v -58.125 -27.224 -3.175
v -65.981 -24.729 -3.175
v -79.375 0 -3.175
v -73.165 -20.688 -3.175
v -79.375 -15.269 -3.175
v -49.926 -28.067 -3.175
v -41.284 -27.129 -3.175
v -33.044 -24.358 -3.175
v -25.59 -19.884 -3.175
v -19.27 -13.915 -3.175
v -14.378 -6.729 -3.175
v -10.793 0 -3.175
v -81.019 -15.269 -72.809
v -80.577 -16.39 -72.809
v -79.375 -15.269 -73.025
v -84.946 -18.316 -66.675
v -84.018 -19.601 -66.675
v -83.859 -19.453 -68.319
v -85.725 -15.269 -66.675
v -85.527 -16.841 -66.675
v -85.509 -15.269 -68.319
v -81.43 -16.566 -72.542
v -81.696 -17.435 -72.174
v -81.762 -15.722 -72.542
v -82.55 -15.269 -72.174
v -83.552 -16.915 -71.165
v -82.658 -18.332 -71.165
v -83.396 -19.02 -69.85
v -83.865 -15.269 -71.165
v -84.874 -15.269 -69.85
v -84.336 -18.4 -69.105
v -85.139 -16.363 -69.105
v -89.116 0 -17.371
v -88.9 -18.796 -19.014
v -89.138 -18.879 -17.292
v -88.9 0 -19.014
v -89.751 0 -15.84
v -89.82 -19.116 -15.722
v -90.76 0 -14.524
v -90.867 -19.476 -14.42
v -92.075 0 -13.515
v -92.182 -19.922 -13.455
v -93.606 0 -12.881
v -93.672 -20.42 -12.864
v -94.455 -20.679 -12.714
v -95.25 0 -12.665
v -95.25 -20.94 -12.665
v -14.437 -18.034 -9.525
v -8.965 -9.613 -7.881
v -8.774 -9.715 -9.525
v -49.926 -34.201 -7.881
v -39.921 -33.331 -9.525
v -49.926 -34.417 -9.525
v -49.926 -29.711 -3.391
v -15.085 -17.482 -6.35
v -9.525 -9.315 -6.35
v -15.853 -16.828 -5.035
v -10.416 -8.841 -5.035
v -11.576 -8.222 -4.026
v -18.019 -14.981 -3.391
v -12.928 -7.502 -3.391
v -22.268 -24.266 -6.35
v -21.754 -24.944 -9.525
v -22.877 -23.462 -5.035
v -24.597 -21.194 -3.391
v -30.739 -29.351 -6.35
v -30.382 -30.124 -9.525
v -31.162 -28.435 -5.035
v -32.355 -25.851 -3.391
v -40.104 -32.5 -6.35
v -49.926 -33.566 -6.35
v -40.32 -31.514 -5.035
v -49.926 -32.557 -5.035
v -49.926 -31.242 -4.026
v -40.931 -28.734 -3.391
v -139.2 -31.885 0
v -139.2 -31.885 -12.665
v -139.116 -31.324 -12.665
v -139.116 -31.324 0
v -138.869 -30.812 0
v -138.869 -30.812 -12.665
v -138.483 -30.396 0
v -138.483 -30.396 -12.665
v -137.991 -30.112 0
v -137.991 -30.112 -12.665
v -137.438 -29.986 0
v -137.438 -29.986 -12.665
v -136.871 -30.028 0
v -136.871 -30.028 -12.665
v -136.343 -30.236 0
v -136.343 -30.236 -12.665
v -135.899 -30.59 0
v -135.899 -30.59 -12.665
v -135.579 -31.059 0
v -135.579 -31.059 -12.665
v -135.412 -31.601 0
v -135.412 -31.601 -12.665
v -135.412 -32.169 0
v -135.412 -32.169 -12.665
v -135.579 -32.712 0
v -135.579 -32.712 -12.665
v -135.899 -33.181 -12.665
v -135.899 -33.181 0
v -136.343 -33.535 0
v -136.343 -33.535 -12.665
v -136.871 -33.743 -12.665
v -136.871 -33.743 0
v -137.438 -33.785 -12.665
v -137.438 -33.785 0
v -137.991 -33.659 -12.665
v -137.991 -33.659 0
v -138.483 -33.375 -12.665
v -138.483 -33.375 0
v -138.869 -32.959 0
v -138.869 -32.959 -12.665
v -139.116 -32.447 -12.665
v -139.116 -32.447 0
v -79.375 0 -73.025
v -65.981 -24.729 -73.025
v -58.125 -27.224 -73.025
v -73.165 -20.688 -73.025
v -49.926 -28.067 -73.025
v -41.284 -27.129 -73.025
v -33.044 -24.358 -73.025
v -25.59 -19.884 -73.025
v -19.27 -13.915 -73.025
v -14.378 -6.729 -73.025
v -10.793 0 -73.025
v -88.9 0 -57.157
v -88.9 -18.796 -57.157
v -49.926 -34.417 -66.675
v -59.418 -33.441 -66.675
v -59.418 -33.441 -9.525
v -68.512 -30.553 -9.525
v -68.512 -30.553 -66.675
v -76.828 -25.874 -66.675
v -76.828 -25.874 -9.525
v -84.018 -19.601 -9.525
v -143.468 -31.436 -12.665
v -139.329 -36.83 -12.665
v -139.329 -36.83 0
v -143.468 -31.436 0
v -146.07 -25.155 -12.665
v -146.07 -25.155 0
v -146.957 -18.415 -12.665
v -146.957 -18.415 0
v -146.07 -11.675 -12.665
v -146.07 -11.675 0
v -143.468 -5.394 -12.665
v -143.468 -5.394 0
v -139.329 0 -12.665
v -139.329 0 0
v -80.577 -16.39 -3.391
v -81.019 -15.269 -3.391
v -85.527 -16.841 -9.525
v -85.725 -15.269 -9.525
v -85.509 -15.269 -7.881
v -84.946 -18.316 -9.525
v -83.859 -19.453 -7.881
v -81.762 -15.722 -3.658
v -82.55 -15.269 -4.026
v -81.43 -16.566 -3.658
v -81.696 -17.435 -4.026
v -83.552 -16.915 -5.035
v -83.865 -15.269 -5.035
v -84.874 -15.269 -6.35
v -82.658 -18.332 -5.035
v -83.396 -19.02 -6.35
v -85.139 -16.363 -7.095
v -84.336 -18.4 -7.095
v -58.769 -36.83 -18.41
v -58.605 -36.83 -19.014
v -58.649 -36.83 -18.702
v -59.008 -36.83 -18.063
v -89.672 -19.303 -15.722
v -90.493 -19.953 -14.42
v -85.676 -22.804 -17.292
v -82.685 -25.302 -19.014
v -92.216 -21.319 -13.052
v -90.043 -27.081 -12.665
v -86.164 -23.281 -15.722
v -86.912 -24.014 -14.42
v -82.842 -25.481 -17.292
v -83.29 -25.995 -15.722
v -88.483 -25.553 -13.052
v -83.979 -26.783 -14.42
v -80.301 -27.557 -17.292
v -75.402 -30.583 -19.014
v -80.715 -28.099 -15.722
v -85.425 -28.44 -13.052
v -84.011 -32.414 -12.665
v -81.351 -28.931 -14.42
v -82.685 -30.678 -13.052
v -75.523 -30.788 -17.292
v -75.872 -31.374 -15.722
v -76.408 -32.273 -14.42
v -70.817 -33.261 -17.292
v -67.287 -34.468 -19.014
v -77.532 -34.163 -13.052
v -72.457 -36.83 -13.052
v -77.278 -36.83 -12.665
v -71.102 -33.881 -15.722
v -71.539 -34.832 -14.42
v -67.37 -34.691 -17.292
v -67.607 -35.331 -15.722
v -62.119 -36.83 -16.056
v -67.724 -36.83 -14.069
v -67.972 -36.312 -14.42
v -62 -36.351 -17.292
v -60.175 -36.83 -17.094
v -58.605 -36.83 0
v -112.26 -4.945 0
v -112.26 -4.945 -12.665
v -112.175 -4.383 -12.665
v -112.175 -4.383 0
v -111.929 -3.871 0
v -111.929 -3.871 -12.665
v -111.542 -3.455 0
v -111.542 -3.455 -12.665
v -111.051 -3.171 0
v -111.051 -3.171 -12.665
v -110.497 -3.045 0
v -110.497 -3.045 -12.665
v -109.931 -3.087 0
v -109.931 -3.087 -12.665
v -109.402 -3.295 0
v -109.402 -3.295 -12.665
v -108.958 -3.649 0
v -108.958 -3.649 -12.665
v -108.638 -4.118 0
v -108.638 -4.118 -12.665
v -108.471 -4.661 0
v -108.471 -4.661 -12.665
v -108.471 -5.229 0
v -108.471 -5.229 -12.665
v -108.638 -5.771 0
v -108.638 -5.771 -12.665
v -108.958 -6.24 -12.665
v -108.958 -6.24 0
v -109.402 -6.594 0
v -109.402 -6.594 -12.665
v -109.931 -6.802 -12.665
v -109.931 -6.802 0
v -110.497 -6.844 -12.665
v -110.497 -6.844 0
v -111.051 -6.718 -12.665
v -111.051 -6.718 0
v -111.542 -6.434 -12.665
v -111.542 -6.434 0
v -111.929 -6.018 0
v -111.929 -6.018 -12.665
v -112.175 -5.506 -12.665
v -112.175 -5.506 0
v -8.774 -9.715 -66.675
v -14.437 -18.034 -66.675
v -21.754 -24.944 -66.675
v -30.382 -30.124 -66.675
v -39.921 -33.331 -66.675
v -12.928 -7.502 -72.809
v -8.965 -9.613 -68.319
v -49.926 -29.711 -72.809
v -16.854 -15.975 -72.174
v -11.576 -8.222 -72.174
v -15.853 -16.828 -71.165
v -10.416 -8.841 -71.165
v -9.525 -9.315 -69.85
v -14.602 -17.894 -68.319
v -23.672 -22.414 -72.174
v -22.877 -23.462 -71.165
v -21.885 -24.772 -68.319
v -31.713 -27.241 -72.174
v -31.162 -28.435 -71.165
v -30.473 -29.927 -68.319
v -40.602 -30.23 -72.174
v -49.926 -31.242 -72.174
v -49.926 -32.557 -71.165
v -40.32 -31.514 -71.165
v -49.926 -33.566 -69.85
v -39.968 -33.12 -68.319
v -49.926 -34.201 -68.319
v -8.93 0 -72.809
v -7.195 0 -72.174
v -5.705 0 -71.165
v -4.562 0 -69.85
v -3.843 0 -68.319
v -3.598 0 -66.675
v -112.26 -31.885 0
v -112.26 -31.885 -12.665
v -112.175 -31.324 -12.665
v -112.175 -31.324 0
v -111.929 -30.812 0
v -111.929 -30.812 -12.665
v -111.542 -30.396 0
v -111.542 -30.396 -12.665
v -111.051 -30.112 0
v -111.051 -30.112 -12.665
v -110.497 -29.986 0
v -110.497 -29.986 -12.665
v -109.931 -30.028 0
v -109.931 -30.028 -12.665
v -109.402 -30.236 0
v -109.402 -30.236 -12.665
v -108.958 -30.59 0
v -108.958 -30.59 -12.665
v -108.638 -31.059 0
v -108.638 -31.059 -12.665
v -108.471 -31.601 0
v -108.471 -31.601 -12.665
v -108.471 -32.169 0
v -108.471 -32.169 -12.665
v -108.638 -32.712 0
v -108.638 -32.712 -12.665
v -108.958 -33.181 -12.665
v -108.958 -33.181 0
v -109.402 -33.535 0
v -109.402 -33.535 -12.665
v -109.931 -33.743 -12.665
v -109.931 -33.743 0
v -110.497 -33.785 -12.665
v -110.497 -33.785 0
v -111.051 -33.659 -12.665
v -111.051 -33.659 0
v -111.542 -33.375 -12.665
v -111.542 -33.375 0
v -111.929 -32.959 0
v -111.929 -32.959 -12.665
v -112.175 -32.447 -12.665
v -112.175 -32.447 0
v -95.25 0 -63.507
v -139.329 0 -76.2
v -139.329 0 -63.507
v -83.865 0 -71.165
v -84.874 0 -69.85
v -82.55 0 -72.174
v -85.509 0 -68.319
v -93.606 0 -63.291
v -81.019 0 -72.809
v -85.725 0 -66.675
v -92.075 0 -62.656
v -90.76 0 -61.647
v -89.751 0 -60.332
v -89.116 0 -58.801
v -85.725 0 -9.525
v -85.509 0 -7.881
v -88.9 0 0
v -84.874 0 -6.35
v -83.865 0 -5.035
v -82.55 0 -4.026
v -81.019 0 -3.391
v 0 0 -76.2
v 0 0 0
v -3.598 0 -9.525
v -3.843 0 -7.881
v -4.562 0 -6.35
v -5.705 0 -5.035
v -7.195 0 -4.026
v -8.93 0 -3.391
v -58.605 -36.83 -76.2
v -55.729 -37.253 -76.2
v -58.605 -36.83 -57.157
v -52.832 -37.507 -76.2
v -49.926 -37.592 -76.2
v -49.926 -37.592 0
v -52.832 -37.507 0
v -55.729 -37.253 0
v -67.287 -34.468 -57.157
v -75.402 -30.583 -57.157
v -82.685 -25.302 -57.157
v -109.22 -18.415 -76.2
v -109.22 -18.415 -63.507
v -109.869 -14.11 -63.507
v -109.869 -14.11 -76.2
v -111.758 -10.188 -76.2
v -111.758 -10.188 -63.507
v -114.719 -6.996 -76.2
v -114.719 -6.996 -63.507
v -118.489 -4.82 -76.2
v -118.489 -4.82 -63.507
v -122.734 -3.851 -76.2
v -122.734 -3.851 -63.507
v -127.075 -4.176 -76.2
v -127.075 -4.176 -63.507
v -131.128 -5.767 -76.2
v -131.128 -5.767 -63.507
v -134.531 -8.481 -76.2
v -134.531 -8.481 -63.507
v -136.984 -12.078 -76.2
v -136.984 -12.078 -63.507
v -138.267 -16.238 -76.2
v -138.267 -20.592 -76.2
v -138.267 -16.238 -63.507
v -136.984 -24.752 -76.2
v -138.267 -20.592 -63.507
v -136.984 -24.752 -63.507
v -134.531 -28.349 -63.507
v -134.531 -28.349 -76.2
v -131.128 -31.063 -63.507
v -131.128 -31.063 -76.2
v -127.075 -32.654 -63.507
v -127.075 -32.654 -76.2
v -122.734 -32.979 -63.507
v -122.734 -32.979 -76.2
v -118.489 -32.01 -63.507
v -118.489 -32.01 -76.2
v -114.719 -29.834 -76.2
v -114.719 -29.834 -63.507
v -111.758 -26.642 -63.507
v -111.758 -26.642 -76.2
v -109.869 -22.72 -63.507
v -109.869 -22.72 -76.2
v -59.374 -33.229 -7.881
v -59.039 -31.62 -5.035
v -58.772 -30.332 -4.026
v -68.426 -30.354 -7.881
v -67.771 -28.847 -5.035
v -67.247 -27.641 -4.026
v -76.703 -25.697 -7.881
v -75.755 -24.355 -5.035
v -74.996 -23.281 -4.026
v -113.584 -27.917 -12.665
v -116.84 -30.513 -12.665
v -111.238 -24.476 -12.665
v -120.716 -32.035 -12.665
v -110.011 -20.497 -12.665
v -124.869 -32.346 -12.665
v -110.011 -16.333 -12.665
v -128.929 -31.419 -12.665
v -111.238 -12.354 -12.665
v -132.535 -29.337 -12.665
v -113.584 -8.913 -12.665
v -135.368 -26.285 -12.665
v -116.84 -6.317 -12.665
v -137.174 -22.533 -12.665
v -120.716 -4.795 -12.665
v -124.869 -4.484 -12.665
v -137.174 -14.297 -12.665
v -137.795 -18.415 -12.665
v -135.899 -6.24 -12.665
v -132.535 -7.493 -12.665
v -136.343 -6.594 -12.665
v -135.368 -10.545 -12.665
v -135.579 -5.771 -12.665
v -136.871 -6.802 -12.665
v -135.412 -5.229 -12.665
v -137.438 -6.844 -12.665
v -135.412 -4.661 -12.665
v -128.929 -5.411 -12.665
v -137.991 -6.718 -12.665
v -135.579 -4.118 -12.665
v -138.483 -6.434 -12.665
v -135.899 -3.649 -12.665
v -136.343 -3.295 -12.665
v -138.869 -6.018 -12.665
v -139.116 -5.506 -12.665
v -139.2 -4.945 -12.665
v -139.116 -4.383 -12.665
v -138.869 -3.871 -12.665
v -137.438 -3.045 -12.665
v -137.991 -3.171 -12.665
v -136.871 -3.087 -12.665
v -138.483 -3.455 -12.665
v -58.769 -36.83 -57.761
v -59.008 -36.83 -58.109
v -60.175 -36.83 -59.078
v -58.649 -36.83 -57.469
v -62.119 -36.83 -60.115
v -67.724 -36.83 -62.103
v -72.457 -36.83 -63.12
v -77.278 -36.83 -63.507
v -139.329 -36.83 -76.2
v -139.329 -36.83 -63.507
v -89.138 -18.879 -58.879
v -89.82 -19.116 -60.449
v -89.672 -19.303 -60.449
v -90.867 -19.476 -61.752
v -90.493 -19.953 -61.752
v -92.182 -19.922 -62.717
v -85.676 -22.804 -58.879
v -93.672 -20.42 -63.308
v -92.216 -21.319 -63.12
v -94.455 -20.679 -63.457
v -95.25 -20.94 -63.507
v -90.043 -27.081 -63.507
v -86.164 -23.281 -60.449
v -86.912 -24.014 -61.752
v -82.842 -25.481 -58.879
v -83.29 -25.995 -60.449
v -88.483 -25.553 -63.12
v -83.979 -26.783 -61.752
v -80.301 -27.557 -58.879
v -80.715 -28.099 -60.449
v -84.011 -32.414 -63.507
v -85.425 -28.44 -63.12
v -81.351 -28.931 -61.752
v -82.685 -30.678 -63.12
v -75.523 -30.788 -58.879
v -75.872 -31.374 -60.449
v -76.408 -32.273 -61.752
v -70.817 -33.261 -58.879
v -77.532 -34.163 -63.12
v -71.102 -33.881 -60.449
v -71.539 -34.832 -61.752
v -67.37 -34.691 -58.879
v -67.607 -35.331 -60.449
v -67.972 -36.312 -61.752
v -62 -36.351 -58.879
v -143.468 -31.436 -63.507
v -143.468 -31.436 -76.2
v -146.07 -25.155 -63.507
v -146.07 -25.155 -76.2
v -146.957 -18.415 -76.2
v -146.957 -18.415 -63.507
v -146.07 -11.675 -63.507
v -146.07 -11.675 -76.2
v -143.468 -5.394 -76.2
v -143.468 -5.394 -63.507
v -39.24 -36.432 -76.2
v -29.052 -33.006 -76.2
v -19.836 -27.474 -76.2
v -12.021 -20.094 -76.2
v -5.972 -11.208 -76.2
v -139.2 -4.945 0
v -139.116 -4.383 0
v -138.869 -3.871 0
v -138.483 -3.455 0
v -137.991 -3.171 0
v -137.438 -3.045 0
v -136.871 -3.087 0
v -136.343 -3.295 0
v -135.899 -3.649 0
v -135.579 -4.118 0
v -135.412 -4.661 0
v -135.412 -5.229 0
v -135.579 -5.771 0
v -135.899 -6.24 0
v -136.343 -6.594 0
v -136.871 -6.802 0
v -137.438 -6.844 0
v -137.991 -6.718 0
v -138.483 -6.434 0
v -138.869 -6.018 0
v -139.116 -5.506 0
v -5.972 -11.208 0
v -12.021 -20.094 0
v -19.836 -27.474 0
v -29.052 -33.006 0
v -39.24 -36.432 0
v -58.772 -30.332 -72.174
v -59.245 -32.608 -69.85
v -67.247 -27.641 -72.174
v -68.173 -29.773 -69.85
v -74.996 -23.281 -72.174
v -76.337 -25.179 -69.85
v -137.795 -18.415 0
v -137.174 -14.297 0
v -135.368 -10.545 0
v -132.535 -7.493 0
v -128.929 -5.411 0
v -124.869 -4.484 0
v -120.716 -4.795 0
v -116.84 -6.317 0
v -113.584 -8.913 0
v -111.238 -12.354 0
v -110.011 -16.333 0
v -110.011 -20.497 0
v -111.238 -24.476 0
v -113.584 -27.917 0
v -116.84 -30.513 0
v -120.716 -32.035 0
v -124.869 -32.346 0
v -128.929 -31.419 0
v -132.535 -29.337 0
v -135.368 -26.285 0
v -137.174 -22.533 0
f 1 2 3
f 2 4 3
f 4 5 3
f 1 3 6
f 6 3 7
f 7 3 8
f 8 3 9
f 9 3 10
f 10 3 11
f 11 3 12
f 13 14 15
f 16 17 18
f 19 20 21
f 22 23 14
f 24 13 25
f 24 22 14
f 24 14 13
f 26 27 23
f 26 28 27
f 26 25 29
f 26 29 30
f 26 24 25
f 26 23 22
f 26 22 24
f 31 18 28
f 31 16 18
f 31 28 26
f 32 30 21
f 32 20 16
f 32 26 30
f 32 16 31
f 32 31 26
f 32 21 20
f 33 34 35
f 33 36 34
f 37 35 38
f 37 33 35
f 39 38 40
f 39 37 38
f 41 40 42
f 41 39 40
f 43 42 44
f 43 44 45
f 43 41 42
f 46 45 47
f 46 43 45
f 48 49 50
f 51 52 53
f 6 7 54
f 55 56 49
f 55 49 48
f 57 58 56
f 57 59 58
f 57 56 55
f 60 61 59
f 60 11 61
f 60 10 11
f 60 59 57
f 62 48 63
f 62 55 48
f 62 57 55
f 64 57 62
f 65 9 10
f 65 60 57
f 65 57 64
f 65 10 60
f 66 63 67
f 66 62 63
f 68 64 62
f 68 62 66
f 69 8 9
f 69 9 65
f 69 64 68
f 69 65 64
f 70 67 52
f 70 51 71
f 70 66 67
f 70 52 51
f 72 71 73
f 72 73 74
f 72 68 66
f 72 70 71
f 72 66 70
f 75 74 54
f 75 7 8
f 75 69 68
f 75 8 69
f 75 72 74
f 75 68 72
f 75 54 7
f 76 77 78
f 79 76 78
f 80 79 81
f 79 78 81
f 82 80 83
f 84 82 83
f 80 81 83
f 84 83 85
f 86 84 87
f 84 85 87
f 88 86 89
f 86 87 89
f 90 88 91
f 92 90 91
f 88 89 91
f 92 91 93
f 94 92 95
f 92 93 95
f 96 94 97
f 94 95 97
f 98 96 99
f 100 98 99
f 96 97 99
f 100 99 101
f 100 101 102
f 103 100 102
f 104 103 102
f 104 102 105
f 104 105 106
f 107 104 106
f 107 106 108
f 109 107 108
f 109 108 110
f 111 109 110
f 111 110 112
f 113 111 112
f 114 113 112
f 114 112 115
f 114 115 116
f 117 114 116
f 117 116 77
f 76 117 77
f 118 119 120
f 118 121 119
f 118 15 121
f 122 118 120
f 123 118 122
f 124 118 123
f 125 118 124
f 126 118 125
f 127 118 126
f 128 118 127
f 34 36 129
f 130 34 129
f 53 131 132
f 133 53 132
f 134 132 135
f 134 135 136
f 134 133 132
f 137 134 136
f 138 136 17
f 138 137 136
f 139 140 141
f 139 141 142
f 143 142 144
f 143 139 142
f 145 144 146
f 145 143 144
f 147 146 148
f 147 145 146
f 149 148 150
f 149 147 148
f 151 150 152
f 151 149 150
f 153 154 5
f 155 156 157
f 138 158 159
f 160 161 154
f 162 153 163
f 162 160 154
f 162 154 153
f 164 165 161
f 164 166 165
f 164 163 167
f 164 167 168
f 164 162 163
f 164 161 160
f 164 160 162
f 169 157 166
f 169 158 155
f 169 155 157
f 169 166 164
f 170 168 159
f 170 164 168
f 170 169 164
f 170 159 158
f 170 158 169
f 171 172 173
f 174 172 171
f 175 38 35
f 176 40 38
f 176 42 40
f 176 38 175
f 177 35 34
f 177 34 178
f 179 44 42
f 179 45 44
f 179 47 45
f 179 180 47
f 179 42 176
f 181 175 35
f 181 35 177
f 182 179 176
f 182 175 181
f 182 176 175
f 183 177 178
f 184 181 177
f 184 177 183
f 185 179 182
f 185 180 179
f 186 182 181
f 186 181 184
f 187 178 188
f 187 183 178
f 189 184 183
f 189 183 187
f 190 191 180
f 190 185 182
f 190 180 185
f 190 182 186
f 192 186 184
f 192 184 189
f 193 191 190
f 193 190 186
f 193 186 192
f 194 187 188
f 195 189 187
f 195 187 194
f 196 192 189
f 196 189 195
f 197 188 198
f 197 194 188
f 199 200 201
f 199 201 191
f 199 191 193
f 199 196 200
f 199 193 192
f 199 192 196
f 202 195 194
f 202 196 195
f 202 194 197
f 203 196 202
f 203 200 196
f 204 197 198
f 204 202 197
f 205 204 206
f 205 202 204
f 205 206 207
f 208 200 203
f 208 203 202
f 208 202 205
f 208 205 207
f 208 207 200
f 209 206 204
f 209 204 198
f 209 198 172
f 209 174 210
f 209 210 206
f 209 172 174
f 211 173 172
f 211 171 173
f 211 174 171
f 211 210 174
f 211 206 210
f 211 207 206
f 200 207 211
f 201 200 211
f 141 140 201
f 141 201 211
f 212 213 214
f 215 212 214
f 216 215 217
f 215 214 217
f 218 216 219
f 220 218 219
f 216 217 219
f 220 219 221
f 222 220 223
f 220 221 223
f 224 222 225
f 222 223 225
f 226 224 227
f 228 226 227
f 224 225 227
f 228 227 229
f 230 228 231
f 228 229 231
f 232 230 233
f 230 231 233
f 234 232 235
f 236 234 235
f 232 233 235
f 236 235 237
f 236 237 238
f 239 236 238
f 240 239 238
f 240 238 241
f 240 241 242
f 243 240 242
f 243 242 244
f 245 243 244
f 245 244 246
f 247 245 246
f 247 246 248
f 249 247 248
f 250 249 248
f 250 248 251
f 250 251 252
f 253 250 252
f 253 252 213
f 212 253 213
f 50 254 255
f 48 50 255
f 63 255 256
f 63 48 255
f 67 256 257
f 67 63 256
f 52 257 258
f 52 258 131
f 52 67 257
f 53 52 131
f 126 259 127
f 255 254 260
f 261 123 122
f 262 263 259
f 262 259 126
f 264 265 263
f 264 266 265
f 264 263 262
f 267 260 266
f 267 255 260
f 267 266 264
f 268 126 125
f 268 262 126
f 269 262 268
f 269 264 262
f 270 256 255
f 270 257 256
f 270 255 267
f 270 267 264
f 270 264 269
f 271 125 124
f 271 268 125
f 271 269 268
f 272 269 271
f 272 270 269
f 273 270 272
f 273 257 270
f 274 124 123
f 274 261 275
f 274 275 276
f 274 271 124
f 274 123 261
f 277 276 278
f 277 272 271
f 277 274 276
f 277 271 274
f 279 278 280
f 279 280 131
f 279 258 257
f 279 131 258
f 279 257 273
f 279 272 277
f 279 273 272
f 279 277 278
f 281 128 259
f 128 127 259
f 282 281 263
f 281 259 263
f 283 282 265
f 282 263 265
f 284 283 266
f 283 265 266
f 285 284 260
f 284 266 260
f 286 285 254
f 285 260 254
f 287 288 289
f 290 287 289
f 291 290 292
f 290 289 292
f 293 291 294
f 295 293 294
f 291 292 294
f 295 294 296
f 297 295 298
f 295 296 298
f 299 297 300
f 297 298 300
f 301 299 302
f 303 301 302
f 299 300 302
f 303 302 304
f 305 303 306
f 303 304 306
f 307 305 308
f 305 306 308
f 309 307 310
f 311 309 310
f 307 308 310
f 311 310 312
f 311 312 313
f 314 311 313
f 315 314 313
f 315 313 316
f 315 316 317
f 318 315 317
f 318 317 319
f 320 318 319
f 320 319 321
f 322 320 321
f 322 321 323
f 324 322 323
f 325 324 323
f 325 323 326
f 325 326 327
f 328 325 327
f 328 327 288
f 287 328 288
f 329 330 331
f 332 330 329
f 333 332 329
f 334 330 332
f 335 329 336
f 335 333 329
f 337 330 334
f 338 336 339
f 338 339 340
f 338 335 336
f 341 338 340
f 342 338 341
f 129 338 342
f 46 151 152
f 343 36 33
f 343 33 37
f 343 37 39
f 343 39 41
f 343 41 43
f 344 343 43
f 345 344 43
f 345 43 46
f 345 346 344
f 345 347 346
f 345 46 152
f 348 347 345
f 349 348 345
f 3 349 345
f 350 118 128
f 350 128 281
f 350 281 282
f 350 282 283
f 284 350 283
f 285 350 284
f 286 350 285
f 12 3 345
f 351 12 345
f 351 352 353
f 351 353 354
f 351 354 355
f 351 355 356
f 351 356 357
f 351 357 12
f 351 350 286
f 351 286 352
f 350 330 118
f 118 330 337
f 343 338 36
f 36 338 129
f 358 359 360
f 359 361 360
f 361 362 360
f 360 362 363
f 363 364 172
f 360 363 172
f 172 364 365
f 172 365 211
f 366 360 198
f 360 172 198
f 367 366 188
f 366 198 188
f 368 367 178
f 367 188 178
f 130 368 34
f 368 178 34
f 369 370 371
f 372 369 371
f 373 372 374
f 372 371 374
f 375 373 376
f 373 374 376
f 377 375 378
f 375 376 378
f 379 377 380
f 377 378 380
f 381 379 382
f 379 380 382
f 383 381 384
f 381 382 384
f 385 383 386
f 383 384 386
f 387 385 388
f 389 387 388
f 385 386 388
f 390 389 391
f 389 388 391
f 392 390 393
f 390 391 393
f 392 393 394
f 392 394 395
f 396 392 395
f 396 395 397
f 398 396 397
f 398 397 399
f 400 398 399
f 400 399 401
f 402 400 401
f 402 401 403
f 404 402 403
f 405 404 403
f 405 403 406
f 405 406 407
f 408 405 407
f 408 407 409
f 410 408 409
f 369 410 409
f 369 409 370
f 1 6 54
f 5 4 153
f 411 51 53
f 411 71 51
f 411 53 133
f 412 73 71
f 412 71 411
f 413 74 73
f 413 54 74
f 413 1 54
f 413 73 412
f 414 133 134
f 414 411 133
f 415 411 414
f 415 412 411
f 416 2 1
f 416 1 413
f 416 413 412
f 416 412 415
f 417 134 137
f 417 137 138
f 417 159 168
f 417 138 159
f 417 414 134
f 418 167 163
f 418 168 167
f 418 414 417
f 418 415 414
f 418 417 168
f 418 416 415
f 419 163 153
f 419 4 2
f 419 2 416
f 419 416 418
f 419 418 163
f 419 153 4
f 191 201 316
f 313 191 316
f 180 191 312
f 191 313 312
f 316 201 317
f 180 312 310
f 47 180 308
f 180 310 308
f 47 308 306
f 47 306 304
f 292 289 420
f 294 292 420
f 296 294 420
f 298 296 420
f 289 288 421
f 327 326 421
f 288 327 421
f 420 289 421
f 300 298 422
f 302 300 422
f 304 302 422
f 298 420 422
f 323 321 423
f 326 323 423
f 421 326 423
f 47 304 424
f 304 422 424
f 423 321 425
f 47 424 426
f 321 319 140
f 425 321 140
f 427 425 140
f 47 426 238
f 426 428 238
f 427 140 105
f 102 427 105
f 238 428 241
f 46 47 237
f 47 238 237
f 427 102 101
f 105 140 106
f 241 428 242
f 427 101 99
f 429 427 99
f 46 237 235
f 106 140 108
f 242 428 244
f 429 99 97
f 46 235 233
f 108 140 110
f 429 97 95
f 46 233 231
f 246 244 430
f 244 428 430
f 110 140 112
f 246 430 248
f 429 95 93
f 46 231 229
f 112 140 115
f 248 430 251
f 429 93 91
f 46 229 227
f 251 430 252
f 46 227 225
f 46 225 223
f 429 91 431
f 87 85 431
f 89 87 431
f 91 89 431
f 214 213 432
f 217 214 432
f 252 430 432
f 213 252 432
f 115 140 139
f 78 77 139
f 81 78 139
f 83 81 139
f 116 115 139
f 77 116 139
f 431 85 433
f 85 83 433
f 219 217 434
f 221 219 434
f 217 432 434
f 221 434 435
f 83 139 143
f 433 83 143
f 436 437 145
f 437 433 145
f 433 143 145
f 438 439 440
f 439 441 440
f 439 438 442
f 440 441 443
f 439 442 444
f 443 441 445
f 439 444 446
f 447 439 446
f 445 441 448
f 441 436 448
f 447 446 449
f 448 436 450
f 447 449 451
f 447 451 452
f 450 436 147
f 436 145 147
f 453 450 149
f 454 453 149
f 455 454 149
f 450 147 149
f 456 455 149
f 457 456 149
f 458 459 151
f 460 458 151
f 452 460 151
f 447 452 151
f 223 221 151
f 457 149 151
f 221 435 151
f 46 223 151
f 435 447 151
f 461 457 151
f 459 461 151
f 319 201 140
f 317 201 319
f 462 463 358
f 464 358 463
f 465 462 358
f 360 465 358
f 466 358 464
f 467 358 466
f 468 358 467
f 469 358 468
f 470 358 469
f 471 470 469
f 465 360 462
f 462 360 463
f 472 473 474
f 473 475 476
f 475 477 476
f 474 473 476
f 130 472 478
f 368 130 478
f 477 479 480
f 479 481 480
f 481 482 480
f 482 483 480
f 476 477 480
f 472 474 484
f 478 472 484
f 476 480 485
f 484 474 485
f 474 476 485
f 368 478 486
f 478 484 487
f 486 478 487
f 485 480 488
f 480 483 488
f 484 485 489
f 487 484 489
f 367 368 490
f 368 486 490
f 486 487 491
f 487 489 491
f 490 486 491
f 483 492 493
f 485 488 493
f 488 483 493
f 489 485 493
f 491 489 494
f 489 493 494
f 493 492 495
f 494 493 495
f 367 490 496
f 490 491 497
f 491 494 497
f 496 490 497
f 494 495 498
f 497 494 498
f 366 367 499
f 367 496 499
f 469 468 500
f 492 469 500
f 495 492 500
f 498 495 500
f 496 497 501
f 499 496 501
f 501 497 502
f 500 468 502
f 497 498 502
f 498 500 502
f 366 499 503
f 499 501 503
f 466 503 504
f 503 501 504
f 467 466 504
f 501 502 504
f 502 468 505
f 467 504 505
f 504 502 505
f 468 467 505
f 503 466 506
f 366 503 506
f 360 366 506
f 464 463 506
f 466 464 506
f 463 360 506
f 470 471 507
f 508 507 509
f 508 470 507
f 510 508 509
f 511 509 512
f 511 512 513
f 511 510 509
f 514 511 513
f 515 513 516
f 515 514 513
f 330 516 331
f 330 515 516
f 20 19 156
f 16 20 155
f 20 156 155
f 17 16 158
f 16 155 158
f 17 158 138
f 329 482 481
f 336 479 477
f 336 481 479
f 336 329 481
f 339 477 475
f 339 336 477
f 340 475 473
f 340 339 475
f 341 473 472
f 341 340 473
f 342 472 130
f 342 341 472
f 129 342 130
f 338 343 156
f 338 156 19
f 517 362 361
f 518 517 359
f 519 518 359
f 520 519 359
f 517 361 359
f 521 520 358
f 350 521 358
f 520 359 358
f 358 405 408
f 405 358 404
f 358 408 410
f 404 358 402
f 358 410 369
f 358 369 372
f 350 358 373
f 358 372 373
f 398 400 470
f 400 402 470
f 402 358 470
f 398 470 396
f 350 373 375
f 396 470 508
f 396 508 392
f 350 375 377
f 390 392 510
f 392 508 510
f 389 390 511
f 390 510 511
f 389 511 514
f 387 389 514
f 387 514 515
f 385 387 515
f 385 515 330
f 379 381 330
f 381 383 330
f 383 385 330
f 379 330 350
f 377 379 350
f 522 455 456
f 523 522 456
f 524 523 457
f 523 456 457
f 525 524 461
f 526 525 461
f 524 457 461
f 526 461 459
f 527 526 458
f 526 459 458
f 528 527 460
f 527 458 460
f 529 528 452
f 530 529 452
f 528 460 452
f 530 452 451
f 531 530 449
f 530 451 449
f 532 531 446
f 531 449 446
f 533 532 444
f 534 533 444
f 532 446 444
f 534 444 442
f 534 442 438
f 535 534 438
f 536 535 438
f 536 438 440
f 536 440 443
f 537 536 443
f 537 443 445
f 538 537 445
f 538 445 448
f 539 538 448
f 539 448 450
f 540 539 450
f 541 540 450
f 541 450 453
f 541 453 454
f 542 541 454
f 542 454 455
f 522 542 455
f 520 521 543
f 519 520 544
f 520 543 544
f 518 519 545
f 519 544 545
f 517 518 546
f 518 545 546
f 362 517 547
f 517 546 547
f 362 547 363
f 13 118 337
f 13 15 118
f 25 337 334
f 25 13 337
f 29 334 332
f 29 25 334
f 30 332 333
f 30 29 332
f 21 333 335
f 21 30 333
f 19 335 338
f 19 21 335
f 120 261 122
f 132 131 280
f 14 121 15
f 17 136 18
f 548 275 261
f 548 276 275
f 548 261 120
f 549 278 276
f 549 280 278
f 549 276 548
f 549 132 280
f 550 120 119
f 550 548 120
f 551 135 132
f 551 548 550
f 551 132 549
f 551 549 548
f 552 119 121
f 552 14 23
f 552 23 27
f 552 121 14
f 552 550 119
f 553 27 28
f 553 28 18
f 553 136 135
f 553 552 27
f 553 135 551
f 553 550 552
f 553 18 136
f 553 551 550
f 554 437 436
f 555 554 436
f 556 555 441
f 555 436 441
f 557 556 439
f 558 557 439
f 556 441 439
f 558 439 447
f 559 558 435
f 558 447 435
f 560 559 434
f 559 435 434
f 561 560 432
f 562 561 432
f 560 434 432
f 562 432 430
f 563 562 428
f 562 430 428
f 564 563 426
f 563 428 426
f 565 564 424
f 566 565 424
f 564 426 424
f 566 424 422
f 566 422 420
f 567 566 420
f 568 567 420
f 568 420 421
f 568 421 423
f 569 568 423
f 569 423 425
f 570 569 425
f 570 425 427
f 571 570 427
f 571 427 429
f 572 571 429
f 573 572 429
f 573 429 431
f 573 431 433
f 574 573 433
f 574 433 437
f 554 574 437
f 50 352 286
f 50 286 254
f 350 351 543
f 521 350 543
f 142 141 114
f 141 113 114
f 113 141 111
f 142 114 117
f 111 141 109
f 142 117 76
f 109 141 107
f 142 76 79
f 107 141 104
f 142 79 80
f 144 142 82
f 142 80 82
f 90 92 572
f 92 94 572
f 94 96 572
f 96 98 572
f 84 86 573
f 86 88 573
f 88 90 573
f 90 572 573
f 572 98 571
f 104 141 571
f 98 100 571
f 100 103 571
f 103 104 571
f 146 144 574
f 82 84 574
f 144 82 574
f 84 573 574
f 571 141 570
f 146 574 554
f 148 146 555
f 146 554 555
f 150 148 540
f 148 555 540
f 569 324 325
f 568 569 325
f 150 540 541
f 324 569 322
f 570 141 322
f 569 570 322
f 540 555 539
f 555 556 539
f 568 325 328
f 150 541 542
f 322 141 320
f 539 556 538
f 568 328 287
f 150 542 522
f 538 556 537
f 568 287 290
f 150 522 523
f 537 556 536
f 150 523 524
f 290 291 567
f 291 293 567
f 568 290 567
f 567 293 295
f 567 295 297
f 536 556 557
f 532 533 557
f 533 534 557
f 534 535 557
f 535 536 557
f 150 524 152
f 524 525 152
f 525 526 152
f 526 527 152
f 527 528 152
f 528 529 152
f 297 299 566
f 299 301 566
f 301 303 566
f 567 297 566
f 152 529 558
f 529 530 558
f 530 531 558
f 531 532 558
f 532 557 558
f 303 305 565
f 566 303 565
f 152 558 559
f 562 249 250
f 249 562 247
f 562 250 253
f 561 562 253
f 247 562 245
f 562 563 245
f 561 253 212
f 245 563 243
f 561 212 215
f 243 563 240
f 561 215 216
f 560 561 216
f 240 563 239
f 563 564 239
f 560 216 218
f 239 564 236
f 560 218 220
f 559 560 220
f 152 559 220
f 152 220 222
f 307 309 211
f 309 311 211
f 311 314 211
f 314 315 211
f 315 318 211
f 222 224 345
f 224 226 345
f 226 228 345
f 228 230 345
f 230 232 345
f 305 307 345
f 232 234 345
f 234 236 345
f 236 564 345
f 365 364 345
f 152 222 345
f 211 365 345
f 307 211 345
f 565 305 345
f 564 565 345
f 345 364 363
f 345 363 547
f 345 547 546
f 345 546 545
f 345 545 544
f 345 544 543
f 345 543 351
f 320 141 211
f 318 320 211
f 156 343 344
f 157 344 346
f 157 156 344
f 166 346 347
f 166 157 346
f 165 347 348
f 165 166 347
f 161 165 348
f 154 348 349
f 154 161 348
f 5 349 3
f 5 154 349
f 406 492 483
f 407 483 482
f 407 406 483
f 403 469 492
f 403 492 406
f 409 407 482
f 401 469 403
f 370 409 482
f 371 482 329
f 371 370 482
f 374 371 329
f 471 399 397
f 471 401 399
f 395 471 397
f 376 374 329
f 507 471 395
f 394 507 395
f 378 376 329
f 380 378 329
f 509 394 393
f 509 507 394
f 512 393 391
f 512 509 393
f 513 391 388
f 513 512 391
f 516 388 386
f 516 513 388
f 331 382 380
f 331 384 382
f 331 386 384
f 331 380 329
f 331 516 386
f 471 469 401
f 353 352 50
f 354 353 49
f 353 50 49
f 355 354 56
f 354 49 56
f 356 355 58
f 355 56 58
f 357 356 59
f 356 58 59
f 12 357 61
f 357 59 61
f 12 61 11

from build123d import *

# Parameters (mm, degrees)
SKETCH1_W                       = 88.9
SKETCH1_H                       = 76.2
BOSS_EXTRUDE1_DEPTH             = 37.592
CUT_EXTRUDE1_REACH              = 124.975
SHELL1_T                        = -3.175
SKETCH16_W                      = 12.664560545
SKETCH16_H                      = 36.83
SKETCH16_W_2                    = 12.692903968
BOSS_EXTRUDE4_DEPTH             = 63.5
BOSS_EXTRUDE4_DIRECTION_2_REACH = 124.975
CUT_EXTRUDE2_REACH              = 171.328
SKETCH18_R                      = 14.605
CUT_EXTRUDE3_REACH              = 171.339
SKETCH20_R                      = 13.97
SKETCH20_R_2                    = 1.905
CUT_EXTRUDE4_DEPTH              = 175.485983575
FILLET2_R                       = 6.35


with BuildPart() as part:
    # Sketch1 → Boss-Extrude1 (new body)
    with BuildSketch(Plane(origin=(0, 0, 0), x_dir=(1, 0, 0), z_dir=(0, 1, 0))):
        with Locations((-44.45, 38.1)):
            Rectangle(SKETCH1_W, SKETCH1_H)
    extrude(amount=-BOSS_EXTRUDE1_DEPTH)

    # Sketch2 → Cut-Extrude1 (cut, up to next)
    with BuildSketch(Plane.XY, mode=Mode.PRIVATE) as cut_extrude1_sk1:
        with BuildLine():
            ThreePointArc((-49.926198023, -37.592), (-71.560931997, -32.647565517), (-88.9, -18.796))
            Line((-88.9, -18.796), (-88.9, -37.592))
            Line((-88.9, -37.592), (-49.926198023, -37.592))
        make_face()
    cut_extrude1_tool1 = extrude(cut_extrude1_sk1.sketch, amount=-CUT_EXTRUDE1_REACH, mode=Mode.PRIVATE) & part.part
    # Sketch2 → Cut-Extrude1 (cut, up to next)
    with BuildSketch(Plane.XY, mode=Mode.PRIVATE) as cut_extrude1_sk2:
        with BuildLine():
            Line((0, -37.592), (0, 0))
            Line((0, 0), (-5.972186469, -11.208166165))
            ThreePointArc((-5.972186469, -11.208166165), (-24.293885313, -30.489622768), (-49.926198023, -37.592))
            Line((-49.926198023, -37.592), (0, -37.592))
        make_face()
    cut_extrude1_tool2 = extrude(cut_extrude1_sk2.sketch, amount=-CUT_EXTRUDE1_REACH, mode=Mode.PRIVATE) & part.part
    add(cut_extrude1_tool1.solids().sort_by_distance((-79.562366, -32.198077, 0))[0], mode=Mode.SUBTRACT)
    add(cut_extrude1_tool2.solids().sort_by_distance((-11.384711, -27.029682, 0))[0], mode=Mode.SUBTRACT)

    # Shell1
    shell1_openings = [part.faces().sort_by_distance(p)[0] for p in [
        (-44.45, 0, -38.1),
    ]]
    offset(amount=SHELL1_T, openings=shell1_openings, kind=Kind.INTERSECTION)

    # Sketch16 → Boss-Extrude4 (add)
    with BuildSketch(Plane.ZY.offset(88.9)):
        with Locations((-6.332280273, -18.415)):
            Rectangle(SKETCH16_W, SKETCH16_H)
        with Locations((-69.853548016, -18.415)):
            Rectangle(SKETCH16_W_2, SKETCH16_H)
    extrude(amount=BOSS_EXTRUDE4_DEPTH)

    # Sketch16 → Boss-Extrude4 direction 2 (add, up to next)
    with BuildSketch(Plane.ZY.offset(88.9), mode=Mode.PRIVATE) as boss_extrude4_direction_2_sk1:
        with Locations((-6.332280273, -18.415)):
            Rectangle(SKETCH16_W, SKETCH16_H)
    boss_extrude4_direction_2_tool1 = extrude(boss_extrude4_direction_2_sk1.sketch, amount=-BOSS_EXTRUDE4_DIRECTION_2_REACH, mode=Mode.PRIVATE) - part.part
    # Sketch16 → Boss-Extrude4 direction 2 (add, up to next)
    with BuildSketch(Plane.ZY.offset(88.9), mode=Mode.PRIVATE) as boss_extrude4_direction_2_sk2:
        with Locations((-69.853548016, -18.415)):
            Rectangle(SKETCH16_W_2, SKETCH16_H)
    boss_extrude4_direction_2_tool2 = extrude(boss_extrude4_direction_2_sk2.sketch, amount=-BOSS_EXTRUDE4_DIRECTION_2_REACH, mode=Mode.PRIVATE) - part.part
    add(boss_extrude4_direction_2_tool1.solids().sort_by_distance((-88.9, -18.415, -6.33228))[0])
    add(boss_extrude4_direction_2_tool2.solids().sort_by_distance((-88.9, -18.415, -69.853548))[0])

    # Sketch18 → Cut-Extrude2 (cut, up to next)
    with BuildSketch(Plane.XY.offset(-63.507096032), mode=Mode.PRIVATE) as cut_extrude2_sk1:
        with Locations((-123.825, -18.415)):
            Circle(SKETCH18_R)
    cut_extrude2_tool1 = extrude(cut_extrude2_sk1.sketch, amount=-CUT_EXTRUDE2_REACH, mode=Mode.PRIVATE) & part.part
    add(cut_extrude2_tool1.solids().sort_by_distance((-123.825, -18.415, -63.507096))[0], mode=Mode.SUBTRACT)

    # Sketch20 → Cut-Extrude3 (cut, up to next)
    with BuildSketch(Plane(origin=(0, 0, -12.664560545), x_dir=(-1, 0, 0), z_dir=(0, 0, -1)), mode=Mode.PRIVATE) as cut_extrude3_sk1:
        with Locations((123.825, -18.415)):
            Circle(SKETCH20_R)
    cut_extrude3_tool1 = extrude(cut_extrude3_sk1.sketch, amount=-CUT_EXTRUDE3_REACH, mode=Mode.PRIVATE) & part.part
    # Sketch20 → Cut-Extrude3 (cut, up to next)
    with BuildSketch(Plane(origin=(0, 0, -12.664560545), x_dir=(-1, 0, 0), z_dir=(0, 0, -1)), mode=Mode.PRIVATE) as cut_extrude3_sk2:
        with Locations((137.295382, -4.944618)):
            Circle(SKETCH20_R_2)
    cut_extrude3_tool2 = extrude(cut_extrude3_sk2.sketch, amount=-CUT_EXTRUDE3_REACH, mode=Mode.PRIVATE) & part.part
    # Sketch20 → Cut-Extrude3 (cut, up to next)
    with BuildSketch(Plane(origin=(0, 0, -12.664560545), x_dir=(-1, 0, 0), z_dir=(0, 0, -1)), mode=Mode.PRIVATE) as cut_extrude3_sk3:
        with Locations((137.295382, -31.885382)):
            Circle(SKETCH20_R_2)
    cut_extrude3_tool3 = extrude(cut_extrude3_sk3.sketch, amount=-CUT_EXTRUDE3_REACH, mode=Mode.PRIVATE) & part.part
    # Sketch20 → Cut-Extrude3 (cut, up to next)
    with BuildSketch(Plane(origin=(0, 0, -12.664560545), x_dir=(-1, 0, 0), z_dir=(0, 0, -1)), mode=Mode.PRIVATE) as cut_extrude3_sk4:
        with Locations((110.354618, -31.885382)):
            Circle(SKETCH20_R_2)
    cut_extrude3_tool4 = extrude(cut_extrude3_sk4.sketch, amount=-CUT_EXTRUDE3_REACH, mode=Mode.PRIVATE) & part.part
    # Sketch20 → Cut-Extrude3 (cut, up to next)
    with BuildSketch(Plane(origin=(0, 0, -12.664560545), x_dir=(-1, 0, 0), z_dir=(0, 0, -1)), mode=Mode.PRIVATE) as cut_extrude3_sk5:
        with Locations((110.354618, -4.944618)):
            Circle(SKETCH20_R_2)
    cut_extrude3_tool5 = extrude(cut_extrude3_sk5.sketch, amount=-CUT_EXTRUDE3_REACH, mode=Mode.PRIVATE) & part.part
    add(cut_extrude3_tool1.solids().sort_by_distance((-123.825, -18.415, -12.664561))[0], mode=Mode.SUBTRACT)
    add(cut_extrude3_tool2.solids().sort_by_distance((-137.295382, -4.944618, -12.664561))[0], mode=Mode.SUBTRACT)
    add(cut_extrude3_tool3.solids().sort_by_distance((-137.295382, -31.885382, -12.664561))[0], mode=Mode.SUBTRACT)
    add(cut_extrude3_tool4.solids().sort_by_distance((-110.354618, -31.885382, -12.664561))[0], mode=Mode.SUBTRACT)
    add(cut_extrude3_tool5.solids().sort_by_distance((-110.354618, -4.944618, -12.664561))[0], mode=Mode.SUBTRACT)

    # Sketch22 → Cut-Extrude4 (cut, through all)
    with BuildSketch(Plane(origin=(0, 0, -76.2), x_dir=(-1, 0, 0), z_dir=(0, 0, -1))):
        with BuildLine():
            Line((139.329278278, 0), (152.4, 0))
            Line((152.4, 0), (152.4, -36.83))
            Line((152.4, -36.83), (139.329278278, -36.83))
            ThreePointArc((139.329278278, -36.83), (146.957021029, -18.415), (139.329278278, 0))
        make_face()
    extrude(amount=-CUT_EXTRUDE4_DEPTH, mode=Mode.SUBTRACT)

    # Fillet2
    fillet2_edges = [part.edges().sort_by_distance(p)[0] for p in [
        (-75.401646537, -30.583390997, -63.507096032),
        (-75.401646537, -30.583390997, -12.664560545),
        (-88.9, -9.398, -63.507096032),
        (-88.9, -9.398, -12.664560545),
        (-6.185914068, -4.857559774, -73.025),
        (-6.185914068, -4.857559774, -3.175),
        (-85.725, -8.83323263, -73.025),
        (-45.133487238, -34.170041352, -73.025),
        (-85.725, -17.66646526, -38.1),
        (-85.725, -8.83323263, -3.175),
        (-45.133487238, -34.170041352, -3.175),
    ]]
    fillet(fillet2_edges, radius=FILLET2_R - 0.0001)  # a hair under: the kernel refuses the full size


solid = part.part
